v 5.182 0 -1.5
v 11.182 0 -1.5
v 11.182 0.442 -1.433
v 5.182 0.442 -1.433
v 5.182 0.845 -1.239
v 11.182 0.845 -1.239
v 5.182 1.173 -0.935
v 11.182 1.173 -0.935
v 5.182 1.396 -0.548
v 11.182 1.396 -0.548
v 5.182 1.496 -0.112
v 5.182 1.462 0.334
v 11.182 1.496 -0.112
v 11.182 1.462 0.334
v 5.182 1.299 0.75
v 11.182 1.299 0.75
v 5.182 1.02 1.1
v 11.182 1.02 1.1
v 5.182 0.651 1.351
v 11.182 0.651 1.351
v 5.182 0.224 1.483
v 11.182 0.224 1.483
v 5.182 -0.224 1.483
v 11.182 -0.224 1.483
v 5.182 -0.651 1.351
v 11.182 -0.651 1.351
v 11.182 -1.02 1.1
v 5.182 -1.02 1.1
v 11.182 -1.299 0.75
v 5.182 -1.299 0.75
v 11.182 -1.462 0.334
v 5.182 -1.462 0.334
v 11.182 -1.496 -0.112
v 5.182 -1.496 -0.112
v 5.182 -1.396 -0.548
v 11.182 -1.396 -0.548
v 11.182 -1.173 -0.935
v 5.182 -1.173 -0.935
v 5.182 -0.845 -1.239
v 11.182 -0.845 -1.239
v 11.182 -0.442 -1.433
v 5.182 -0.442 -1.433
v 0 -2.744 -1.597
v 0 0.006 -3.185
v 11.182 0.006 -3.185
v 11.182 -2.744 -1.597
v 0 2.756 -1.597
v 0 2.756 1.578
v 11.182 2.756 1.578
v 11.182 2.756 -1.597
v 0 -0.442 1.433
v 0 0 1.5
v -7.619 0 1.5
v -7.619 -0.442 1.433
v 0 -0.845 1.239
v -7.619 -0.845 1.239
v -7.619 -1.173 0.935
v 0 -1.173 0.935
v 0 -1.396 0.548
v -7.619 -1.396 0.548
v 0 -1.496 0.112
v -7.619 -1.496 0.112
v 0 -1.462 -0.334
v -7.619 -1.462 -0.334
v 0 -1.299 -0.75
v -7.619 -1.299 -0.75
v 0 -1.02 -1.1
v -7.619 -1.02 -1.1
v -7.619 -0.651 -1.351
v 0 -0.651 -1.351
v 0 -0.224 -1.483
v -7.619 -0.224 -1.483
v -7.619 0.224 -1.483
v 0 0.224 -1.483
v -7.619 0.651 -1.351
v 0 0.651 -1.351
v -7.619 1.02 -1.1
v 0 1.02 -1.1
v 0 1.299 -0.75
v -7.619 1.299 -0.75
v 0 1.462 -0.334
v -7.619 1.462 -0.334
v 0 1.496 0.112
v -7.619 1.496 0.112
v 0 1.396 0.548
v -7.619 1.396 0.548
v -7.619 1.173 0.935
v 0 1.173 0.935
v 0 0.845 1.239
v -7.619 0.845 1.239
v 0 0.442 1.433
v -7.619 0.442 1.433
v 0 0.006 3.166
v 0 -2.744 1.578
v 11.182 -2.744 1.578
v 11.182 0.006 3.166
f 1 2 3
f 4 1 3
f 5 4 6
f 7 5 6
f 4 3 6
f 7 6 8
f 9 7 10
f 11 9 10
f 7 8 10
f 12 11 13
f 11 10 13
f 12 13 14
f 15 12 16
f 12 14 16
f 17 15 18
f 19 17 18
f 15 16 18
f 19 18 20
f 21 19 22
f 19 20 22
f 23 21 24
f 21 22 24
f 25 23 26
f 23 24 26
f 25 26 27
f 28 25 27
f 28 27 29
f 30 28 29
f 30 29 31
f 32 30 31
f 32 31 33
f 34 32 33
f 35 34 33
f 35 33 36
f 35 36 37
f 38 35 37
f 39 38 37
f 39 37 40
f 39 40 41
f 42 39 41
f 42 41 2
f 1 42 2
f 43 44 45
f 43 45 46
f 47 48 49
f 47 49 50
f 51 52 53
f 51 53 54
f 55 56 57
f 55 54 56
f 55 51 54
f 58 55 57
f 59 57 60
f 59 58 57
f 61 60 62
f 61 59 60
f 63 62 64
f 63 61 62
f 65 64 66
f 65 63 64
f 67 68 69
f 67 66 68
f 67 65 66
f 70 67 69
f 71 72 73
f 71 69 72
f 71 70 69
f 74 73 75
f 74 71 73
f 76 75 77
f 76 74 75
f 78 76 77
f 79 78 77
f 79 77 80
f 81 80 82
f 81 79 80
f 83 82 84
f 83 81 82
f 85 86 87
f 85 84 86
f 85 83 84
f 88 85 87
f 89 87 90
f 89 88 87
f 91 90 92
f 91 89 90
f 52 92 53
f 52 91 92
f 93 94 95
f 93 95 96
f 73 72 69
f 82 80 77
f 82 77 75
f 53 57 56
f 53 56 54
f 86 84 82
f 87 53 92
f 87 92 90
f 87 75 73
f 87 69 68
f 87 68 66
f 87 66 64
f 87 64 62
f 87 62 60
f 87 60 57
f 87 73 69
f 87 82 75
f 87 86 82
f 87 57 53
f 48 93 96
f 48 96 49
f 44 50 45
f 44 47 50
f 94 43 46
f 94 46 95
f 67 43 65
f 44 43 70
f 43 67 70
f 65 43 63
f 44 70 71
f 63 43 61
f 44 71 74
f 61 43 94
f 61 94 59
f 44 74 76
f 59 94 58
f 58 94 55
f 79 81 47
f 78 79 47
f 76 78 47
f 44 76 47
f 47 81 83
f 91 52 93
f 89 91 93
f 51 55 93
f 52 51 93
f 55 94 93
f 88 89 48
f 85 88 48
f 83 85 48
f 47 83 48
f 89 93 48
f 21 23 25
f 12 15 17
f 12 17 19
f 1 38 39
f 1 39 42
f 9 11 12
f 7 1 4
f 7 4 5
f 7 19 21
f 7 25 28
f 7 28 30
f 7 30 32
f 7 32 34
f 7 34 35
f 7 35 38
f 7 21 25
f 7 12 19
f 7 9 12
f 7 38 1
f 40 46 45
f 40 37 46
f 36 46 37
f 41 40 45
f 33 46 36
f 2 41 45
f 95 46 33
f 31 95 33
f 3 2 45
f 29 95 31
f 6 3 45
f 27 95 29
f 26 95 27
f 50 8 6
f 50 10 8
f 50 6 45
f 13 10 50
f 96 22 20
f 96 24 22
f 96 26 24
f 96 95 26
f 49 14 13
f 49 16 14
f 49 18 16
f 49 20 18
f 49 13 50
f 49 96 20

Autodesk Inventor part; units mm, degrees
ref_plane "YZ Plane" through (0, 0, 0) normal (1, 0, 0) x (0, 1, 0)
ref_plane "XZ Plane" through (0, 0, 0) normal (0, 1, 0) x (-1, 0, 0)
ref_plane "XY Plane" through (0, 0, 0) normal (0, 0, 1) x (1, 0, 0)
sketch "Sketch1" plane through (0, 0, 0) normal (1, 0, 0) x (0, 1, 0)
  line L0 (0.0055, 3.1659) -> (2.7555, 1.5782)
  line L1 (2.7555, 1.5782) -> (2.7555, -1.5973)
  line L2 (2.7555, -1.5973) -> (0.0055, -3.185)
  line L3 (0.0055, -3.185) -> (-2.7445, -1.5973)
  line L4 (-2.7445, -1.5973) -> (-2.7445, 1.5782)
  line L5 (-2.7445, 1.5782) -> (0.0055, 3.1659)
  point P0 (0.0055, -0.0095)
  dimension "d1" = 5.5
extrude "Extrusion1" add sketch "Sketch1" along normal blind 11.182
sketch "Sketch2" plane through (0, 0, 0) normal (-1, 0, 0) x (0, 0, 1)
  circle A0 centre (0, 0) radius 1.5
  dimension "d4" = 3
extrude "Extrusion2" add sketch "Sketch2" along normal blind 7.619
sketch "Sketch3" plane through (11.182, 0, 0) normal (1, 0, 0) x (0, 0, -1)
  circle A0 centre (0, 0) radius 1.5
  dimension "d7" = 3
extrude "Extrusion3" cut sketch "Sketch3" against normal blind 6
properties part number "Spacer" material "Brass, Soft Yellow"
